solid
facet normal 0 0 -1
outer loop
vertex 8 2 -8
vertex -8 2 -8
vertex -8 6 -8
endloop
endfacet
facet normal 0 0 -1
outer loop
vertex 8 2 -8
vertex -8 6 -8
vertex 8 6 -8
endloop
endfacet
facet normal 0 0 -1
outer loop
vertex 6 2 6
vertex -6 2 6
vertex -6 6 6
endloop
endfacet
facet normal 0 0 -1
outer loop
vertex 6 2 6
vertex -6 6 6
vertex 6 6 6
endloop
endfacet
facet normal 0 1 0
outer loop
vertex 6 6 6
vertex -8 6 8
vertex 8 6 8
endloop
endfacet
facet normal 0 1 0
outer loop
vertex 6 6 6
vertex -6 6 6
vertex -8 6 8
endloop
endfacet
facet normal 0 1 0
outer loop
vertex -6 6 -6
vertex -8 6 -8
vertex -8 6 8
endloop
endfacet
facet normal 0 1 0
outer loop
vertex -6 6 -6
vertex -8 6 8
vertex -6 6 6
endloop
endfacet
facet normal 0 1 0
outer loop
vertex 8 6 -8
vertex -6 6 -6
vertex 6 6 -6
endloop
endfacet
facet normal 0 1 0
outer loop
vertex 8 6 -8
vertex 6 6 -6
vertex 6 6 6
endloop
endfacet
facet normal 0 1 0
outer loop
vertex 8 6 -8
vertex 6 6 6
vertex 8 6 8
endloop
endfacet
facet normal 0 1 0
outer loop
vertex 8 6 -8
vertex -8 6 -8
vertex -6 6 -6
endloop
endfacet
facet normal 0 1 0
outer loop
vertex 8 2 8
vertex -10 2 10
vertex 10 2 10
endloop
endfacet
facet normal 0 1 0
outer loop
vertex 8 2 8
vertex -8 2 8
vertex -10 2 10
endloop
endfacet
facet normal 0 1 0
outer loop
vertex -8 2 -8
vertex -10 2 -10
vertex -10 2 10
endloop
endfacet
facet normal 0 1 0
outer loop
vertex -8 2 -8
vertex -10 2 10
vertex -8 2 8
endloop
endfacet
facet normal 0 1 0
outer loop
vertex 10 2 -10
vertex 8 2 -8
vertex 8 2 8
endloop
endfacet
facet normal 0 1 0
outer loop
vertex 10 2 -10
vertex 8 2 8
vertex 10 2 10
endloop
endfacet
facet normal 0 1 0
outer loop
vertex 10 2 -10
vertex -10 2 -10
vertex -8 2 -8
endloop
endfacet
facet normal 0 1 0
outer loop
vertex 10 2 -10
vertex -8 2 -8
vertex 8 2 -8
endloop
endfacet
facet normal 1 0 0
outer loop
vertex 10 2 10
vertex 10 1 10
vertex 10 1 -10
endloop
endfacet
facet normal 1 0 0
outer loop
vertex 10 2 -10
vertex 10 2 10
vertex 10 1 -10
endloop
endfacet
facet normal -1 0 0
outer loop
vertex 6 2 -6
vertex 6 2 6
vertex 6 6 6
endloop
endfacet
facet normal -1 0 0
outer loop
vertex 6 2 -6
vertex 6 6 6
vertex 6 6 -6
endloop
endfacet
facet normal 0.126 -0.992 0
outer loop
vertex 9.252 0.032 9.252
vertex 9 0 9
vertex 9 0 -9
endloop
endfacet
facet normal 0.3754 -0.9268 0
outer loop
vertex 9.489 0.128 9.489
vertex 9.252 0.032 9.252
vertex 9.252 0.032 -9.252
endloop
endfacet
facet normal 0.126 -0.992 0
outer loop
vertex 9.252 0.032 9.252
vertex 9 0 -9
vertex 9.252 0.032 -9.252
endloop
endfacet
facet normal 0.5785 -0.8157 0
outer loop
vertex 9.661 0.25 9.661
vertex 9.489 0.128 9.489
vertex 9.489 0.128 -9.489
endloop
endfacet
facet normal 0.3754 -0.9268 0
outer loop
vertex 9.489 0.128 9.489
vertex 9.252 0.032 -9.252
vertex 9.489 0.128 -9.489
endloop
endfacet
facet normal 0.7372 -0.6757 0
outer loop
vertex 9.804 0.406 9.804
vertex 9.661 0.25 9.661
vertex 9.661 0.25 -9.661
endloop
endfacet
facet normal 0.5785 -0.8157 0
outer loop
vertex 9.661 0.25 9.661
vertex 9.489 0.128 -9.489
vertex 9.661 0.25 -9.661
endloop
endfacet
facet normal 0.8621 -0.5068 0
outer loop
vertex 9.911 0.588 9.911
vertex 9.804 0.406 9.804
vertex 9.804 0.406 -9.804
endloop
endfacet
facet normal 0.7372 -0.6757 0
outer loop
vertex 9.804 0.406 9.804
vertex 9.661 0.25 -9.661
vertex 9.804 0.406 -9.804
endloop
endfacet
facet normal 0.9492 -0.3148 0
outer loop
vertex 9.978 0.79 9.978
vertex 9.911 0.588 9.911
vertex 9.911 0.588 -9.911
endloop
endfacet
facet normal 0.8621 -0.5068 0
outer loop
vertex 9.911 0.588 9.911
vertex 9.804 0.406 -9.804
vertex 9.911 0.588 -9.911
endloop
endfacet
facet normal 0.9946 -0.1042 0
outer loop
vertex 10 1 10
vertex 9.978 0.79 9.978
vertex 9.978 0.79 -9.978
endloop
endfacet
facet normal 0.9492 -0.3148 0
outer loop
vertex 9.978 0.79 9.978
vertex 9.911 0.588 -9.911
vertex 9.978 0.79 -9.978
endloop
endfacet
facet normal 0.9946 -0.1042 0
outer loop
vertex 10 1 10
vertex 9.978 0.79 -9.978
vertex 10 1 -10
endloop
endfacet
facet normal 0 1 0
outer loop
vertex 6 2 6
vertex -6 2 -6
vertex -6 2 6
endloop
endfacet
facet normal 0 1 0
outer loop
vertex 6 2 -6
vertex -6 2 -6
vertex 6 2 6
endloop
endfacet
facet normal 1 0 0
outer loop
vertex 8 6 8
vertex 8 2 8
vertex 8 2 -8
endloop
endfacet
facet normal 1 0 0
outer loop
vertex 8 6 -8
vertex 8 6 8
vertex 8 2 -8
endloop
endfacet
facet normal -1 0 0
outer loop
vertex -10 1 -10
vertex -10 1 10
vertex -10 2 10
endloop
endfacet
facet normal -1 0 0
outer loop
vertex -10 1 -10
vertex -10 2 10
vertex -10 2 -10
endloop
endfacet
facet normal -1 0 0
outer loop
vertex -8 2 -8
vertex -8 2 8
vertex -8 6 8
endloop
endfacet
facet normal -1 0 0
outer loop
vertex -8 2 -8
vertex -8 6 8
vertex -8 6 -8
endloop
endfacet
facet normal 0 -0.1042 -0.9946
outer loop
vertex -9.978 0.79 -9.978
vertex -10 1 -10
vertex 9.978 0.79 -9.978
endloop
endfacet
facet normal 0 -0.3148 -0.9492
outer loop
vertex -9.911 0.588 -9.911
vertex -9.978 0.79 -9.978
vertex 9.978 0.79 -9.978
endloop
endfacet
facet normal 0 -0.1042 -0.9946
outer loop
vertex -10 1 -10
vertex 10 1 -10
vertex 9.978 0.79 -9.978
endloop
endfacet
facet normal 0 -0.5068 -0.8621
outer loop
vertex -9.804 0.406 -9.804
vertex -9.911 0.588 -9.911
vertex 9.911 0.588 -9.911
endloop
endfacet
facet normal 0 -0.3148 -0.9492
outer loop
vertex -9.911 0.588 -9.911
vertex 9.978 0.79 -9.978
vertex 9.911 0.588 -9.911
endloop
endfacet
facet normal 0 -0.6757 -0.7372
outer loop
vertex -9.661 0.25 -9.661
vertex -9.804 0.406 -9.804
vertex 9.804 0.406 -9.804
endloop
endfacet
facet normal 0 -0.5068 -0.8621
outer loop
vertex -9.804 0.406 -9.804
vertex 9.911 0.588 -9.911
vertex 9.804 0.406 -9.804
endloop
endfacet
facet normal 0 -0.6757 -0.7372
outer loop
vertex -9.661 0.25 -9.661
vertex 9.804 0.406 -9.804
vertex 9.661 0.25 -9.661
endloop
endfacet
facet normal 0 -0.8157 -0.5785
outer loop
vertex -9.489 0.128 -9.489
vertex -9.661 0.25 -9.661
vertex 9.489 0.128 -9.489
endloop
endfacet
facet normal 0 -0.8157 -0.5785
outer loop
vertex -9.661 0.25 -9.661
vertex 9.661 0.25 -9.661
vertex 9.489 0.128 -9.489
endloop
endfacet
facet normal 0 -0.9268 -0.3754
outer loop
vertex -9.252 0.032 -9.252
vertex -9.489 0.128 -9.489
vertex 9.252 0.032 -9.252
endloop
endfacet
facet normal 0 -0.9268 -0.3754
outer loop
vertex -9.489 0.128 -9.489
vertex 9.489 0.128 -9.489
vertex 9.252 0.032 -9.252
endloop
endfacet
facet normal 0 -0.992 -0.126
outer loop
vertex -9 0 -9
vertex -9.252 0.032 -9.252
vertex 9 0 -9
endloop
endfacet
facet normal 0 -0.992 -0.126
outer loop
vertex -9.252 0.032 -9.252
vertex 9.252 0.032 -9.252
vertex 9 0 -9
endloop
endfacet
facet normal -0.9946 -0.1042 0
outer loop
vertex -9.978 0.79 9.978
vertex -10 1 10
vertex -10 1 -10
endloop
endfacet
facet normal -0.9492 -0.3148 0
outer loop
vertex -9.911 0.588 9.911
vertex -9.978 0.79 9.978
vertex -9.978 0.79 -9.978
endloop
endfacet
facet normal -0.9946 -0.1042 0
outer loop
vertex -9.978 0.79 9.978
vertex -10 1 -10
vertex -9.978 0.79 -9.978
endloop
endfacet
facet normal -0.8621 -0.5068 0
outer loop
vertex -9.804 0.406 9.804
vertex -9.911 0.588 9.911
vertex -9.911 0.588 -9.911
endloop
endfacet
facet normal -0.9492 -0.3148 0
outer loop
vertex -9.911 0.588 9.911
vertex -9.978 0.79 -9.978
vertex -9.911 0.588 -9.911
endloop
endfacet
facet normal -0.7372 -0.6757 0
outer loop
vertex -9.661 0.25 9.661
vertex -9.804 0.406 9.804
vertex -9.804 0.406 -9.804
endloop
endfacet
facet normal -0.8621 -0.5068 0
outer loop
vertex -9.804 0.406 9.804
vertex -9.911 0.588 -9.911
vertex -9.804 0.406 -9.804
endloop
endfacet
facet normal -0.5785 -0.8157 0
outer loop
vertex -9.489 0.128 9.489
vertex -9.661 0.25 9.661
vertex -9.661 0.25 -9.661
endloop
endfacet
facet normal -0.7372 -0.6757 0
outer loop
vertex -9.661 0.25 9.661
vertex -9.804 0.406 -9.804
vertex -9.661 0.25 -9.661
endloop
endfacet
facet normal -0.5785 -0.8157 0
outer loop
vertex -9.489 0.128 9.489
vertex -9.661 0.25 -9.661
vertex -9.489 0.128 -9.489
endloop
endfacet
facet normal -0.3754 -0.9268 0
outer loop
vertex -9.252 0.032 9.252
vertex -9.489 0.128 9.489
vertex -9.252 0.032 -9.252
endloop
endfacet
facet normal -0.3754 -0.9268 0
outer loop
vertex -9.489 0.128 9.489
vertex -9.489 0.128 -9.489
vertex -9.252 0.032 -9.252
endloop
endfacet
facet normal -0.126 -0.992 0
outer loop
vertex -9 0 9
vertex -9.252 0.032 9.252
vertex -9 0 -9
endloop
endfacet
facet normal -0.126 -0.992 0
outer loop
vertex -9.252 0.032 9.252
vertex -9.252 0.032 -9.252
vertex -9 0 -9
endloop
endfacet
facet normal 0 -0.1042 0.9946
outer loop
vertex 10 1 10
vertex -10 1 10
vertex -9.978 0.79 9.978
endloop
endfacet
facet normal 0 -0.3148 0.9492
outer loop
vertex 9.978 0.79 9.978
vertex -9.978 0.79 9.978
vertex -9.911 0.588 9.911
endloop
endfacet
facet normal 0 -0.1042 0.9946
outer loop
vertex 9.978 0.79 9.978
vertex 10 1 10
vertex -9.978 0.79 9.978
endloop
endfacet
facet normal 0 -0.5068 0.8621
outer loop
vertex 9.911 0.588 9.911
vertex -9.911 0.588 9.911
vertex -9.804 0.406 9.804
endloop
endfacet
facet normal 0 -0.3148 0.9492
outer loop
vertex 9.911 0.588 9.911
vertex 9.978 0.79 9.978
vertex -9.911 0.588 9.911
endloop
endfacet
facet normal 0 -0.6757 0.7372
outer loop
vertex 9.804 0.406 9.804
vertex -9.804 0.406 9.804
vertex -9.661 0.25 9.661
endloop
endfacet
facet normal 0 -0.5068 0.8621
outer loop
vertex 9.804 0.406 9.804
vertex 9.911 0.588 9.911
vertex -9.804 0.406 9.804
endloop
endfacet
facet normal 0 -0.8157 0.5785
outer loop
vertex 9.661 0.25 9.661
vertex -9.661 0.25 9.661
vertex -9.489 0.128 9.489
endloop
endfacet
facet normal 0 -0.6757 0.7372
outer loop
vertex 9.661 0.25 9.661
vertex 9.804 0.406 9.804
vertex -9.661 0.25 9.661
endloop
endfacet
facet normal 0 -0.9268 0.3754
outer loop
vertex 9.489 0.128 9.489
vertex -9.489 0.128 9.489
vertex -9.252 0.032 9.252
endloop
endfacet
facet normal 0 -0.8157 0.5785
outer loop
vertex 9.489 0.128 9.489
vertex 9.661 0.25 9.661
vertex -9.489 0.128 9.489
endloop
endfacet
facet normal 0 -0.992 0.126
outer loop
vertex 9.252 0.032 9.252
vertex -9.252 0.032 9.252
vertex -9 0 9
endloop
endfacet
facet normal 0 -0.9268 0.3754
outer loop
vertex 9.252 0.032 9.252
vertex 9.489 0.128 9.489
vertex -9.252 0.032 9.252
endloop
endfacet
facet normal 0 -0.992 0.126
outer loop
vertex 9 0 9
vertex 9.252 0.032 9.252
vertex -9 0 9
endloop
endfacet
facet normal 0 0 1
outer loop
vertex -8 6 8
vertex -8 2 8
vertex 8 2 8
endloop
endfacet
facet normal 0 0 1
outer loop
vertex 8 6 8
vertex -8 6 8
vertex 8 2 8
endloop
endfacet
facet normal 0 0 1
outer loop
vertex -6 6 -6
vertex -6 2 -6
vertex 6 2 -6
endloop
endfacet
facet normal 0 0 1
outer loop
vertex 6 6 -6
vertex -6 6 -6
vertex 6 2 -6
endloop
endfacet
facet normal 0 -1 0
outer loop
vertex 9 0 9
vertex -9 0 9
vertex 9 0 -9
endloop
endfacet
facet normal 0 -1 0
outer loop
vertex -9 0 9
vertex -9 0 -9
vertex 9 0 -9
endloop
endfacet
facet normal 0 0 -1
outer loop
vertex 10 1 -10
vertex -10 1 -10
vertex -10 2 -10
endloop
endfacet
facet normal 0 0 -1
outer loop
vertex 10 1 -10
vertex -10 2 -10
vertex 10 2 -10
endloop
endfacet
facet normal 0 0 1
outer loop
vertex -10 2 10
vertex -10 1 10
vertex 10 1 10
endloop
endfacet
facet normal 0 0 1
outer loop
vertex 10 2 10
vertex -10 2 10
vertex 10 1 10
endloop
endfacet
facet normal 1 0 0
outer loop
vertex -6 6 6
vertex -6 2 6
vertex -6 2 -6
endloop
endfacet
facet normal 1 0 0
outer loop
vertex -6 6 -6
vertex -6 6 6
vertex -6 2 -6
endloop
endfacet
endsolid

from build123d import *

# Parameters (mm, degrees)
SKETCH1_W           = 20
SKETCH1_H           = 20
BOSS_EXTRUDE1_DEPTH = 2
SKETCH2_W           = 16
SKETCH2_H           = 16
SKETCH2_W_2         = 12
SKETCH2_H_2         = 12
BOSS_EXTRUDE2_DEPTH = 4
FILLET1_R           = 1


with BuildPart() as part:
    # Sketch1 → Boss-Extrude1 (new body)
    with BuildSketch(Plane(origin=(0, 0, 0), x_dir=(1, 0, 0), z_dir=(0, 1, 0))):
        Rectangle(SKETCH1_W, SKETCH1_H)
    extrude(amount=BOSS_EXTRUDE1_DEPTH)

    # Sketch2 → Boss-Extrude2 (add)
    with BuildSketch(Plane(origin=(0, 2, 0), x_dir=(1, 0, 0), z_dir=(0, 1, 0))):
        Rectangle(SKETCH2_W, SKETCH2_H)
        Rectangle(SKETCH2_W_2, SKETCH2_H_2, mode=Mode.SUBTRACT)
    extrude(amount=BOSS_EXTRUDE2_DEPTH)

    # Fillet1
    fillet1_edges = [part.edges().sort_by_distance(p)[0] for p in [
        (0, 0, 10),
        (-10, 0, 0),
        (0, 0, -10),
        (10, 0, 0),
    ]]
    fillet(fillet1_edges, radius=FILLET1_R)


solid = part.part
